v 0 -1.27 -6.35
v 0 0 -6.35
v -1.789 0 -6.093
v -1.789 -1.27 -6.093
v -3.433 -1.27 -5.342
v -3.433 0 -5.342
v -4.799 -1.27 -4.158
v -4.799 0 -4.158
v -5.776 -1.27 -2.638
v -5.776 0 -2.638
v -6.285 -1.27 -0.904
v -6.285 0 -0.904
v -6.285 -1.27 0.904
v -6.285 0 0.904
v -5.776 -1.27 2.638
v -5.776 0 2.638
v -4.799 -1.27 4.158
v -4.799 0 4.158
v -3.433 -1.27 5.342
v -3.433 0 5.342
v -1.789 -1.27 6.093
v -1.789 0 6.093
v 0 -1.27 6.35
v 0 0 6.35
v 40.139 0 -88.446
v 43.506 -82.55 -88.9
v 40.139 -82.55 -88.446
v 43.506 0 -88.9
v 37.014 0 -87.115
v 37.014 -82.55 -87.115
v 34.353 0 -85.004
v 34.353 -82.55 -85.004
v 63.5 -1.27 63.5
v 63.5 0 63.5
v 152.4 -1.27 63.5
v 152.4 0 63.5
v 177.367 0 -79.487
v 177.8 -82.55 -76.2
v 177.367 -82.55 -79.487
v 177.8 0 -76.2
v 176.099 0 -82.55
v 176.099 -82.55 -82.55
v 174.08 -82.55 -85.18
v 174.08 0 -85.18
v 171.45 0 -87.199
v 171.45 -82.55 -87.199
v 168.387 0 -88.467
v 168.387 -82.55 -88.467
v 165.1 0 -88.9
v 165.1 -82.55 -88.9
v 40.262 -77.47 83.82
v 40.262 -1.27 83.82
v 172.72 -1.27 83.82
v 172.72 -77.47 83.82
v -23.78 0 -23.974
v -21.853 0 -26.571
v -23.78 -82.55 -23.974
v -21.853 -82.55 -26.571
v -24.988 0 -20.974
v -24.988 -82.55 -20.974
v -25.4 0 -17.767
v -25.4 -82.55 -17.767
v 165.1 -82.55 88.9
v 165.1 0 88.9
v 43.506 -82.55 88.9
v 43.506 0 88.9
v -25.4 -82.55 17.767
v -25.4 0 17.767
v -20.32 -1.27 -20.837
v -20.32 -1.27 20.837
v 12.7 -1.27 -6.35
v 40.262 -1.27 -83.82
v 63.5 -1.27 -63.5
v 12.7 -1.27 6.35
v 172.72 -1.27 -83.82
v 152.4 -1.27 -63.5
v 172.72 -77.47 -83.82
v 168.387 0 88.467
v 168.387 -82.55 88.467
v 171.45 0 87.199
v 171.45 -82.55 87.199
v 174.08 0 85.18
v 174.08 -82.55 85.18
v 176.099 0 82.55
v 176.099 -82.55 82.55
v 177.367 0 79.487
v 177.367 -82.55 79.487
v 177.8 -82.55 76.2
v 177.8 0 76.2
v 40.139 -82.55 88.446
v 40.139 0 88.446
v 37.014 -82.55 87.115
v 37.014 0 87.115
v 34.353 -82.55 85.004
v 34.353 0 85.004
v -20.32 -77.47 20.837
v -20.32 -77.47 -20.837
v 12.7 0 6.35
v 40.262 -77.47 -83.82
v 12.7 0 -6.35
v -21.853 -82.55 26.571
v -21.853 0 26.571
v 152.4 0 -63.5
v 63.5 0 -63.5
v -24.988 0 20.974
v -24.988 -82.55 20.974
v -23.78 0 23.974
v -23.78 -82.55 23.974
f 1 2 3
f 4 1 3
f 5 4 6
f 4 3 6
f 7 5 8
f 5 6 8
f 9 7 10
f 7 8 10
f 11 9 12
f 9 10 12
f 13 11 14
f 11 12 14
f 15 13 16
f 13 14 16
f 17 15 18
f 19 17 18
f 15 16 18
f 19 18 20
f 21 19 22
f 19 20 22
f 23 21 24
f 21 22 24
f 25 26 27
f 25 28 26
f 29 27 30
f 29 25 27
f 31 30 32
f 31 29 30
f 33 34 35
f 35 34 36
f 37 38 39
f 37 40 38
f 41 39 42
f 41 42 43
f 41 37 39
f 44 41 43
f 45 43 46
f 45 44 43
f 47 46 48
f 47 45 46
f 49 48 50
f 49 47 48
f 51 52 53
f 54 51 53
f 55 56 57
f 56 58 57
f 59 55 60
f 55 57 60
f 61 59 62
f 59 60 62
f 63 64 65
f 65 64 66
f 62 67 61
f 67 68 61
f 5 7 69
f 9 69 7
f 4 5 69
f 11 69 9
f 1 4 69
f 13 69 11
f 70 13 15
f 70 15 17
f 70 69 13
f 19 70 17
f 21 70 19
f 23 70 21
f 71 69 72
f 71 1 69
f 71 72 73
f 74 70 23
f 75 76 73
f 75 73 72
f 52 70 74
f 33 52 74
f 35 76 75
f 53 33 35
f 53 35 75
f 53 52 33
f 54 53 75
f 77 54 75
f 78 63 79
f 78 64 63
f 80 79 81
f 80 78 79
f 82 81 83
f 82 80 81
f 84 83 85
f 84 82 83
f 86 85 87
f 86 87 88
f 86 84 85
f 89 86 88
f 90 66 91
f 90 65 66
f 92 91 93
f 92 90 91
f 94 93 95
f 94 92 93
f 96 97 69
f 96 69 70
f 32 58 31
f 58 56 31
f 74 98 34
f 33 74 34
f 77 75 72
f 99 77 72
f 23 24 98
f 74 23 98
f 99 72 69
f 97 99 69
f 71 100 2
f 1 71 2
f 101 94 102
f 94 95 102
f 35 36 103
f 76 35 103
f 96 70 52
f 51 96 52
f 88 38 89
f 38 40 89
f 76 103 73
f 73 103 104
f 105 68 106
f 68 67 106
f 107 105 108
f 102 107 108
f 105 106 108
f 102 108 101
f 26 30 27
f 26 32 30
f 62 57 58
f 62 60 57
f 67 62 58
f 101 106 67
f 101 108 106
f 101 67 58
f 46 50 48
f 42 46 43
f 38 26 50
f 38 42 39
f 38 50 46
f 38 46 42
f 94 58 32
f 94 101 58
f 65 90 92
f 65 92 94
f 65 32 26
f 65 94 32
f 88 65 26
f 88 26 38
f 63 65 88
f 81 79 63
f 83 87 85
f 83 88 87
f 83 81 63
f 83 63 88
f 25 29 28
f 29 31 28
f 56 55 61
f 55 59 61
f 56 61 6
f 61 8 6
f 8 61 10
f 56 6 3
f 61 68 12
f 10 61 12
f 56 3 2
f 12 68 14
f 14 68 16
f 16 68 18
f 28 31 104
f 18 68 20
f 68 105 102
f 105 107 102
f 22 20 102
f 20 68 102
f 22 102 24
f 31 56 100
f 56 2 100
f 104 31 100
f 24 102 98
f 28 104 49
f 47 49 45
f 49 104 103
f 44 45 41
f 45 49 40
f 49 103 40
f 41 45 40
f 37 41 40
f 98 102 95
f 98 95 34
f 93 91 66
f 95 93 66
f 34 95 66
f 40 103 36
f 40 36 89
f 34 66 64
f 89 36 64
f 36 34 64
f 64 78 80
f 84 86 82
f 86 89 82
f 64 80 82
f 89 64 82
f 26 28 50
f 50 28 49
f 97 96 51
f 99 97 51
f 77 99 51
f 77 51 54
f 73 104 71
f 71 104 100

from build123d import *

# Parameters (mm, degrees)
F1_DEPTH = 1.27
F3_DEPTH = 76.2
F5_DEPTH = 5.08
F6_R     = 12.7
F7_R     = 12.7


with BuildPart() as f1:
    # F0 (on Front) → F1 (new body)
    with BuildSketch(Plane.XZ):
        Polygon((-25.4, 22.8833369911), (-25.4, 0), (-25.4, -22.8833369911), (38.1, -88.9), (177.8, -88.9), (177.8, 0), (177.8, 88.9), (38.1, 88.9), align=None)
        with BuildLine():
            Line((0, 6.35), (12.7, 6.35))
            Line((12.7, 6.35), (63.5, 63.5))
            Line((63.5, 63.5), (152.4, 63.5))
            Line((152.4, 63.5), (152.4, 0))
            Line((152.4, 0), (152.4, -63.5))
            Line((152.4, -63.5), (63.5, -63.5))
            Line((63.5, -63.5), (12.7, -6.35))
            Line((12.7, -6.35), (0, -6.35))
            ThreePointArc((0, -6.35), (-6.35, 0), (0, 6.35))
        make_face(mode=Mode.SUBTRACT)
    extrude(amount=F1_DEPTH)

    # F2 (on face) → F3 (join)
    with BuildSketch(Plane.XZ.offset(1.27)):
        Polygon((38.1, 88.9), (-25.4, 22.8833369911), (-25.4, -22.8833369911), (38.1, -88.9), (177.8, -88.9), (177.8, 88.9), align=None)
        Polygon((40.2622562786, -83.82), (-20.32, -20.8367181565), (-20.32, 20.8367181565), (40.2622562786, 83.82), (172.72, 83.82), (172.72, -83.82), align=None, mode=Mode.SUBTRACT)
    extrude(amount=F3_DEPTH)

    # F4 (on face) → F5 (join)
    with BuildSketch(Plane.XZ.offset(77.47)):
        Polygon((177.8, 88.9), (38.1, 88.9), (-25.4, 22.8833369911), (-25.4, -22.8833369911), (38.1, -88.9), (177.8, -88.9), align=None)
        Polygon((172.72, -83.82), (40.2622562786, -83.82), (-20.32, -20.8367181565), (-20.32, 20.8367181565), (40.2622562786, 83.82), (172.72, 83.82), align=None, mode=Mode.SUBTRACT)
        Polygon((-20.32, -20.8367181565), (40.2622562786, -83.82), (172.72, -83.82), (172.72, 83.82), (40.2622562786, 83.82), (-20.32, 20.8367181565), align=None)
    extrude(amount=F5_DEPTH)

    # F6
    f6_edges = [f1.edges().sort_by_distance(p)[0] for p in [
        (-25.4, -41.275, 22.883337),
        (-25.4, -41.275, -22.883337),
        (38.1, -41.275, 88.9),
        (38.1, -41.275, -88.9),
    ]]
    fillet(f6_edges, radius=F6_R)

    # F7
    f7_edges = [f1.edges().sort_by_distance(p)[0] for p in [
        (177.8, -41.275, 88.9),
        (177.8, -41.275, -88.9),
    ]]
    fillet(f7_edges, radius=F7_R)


solid = f1.part
